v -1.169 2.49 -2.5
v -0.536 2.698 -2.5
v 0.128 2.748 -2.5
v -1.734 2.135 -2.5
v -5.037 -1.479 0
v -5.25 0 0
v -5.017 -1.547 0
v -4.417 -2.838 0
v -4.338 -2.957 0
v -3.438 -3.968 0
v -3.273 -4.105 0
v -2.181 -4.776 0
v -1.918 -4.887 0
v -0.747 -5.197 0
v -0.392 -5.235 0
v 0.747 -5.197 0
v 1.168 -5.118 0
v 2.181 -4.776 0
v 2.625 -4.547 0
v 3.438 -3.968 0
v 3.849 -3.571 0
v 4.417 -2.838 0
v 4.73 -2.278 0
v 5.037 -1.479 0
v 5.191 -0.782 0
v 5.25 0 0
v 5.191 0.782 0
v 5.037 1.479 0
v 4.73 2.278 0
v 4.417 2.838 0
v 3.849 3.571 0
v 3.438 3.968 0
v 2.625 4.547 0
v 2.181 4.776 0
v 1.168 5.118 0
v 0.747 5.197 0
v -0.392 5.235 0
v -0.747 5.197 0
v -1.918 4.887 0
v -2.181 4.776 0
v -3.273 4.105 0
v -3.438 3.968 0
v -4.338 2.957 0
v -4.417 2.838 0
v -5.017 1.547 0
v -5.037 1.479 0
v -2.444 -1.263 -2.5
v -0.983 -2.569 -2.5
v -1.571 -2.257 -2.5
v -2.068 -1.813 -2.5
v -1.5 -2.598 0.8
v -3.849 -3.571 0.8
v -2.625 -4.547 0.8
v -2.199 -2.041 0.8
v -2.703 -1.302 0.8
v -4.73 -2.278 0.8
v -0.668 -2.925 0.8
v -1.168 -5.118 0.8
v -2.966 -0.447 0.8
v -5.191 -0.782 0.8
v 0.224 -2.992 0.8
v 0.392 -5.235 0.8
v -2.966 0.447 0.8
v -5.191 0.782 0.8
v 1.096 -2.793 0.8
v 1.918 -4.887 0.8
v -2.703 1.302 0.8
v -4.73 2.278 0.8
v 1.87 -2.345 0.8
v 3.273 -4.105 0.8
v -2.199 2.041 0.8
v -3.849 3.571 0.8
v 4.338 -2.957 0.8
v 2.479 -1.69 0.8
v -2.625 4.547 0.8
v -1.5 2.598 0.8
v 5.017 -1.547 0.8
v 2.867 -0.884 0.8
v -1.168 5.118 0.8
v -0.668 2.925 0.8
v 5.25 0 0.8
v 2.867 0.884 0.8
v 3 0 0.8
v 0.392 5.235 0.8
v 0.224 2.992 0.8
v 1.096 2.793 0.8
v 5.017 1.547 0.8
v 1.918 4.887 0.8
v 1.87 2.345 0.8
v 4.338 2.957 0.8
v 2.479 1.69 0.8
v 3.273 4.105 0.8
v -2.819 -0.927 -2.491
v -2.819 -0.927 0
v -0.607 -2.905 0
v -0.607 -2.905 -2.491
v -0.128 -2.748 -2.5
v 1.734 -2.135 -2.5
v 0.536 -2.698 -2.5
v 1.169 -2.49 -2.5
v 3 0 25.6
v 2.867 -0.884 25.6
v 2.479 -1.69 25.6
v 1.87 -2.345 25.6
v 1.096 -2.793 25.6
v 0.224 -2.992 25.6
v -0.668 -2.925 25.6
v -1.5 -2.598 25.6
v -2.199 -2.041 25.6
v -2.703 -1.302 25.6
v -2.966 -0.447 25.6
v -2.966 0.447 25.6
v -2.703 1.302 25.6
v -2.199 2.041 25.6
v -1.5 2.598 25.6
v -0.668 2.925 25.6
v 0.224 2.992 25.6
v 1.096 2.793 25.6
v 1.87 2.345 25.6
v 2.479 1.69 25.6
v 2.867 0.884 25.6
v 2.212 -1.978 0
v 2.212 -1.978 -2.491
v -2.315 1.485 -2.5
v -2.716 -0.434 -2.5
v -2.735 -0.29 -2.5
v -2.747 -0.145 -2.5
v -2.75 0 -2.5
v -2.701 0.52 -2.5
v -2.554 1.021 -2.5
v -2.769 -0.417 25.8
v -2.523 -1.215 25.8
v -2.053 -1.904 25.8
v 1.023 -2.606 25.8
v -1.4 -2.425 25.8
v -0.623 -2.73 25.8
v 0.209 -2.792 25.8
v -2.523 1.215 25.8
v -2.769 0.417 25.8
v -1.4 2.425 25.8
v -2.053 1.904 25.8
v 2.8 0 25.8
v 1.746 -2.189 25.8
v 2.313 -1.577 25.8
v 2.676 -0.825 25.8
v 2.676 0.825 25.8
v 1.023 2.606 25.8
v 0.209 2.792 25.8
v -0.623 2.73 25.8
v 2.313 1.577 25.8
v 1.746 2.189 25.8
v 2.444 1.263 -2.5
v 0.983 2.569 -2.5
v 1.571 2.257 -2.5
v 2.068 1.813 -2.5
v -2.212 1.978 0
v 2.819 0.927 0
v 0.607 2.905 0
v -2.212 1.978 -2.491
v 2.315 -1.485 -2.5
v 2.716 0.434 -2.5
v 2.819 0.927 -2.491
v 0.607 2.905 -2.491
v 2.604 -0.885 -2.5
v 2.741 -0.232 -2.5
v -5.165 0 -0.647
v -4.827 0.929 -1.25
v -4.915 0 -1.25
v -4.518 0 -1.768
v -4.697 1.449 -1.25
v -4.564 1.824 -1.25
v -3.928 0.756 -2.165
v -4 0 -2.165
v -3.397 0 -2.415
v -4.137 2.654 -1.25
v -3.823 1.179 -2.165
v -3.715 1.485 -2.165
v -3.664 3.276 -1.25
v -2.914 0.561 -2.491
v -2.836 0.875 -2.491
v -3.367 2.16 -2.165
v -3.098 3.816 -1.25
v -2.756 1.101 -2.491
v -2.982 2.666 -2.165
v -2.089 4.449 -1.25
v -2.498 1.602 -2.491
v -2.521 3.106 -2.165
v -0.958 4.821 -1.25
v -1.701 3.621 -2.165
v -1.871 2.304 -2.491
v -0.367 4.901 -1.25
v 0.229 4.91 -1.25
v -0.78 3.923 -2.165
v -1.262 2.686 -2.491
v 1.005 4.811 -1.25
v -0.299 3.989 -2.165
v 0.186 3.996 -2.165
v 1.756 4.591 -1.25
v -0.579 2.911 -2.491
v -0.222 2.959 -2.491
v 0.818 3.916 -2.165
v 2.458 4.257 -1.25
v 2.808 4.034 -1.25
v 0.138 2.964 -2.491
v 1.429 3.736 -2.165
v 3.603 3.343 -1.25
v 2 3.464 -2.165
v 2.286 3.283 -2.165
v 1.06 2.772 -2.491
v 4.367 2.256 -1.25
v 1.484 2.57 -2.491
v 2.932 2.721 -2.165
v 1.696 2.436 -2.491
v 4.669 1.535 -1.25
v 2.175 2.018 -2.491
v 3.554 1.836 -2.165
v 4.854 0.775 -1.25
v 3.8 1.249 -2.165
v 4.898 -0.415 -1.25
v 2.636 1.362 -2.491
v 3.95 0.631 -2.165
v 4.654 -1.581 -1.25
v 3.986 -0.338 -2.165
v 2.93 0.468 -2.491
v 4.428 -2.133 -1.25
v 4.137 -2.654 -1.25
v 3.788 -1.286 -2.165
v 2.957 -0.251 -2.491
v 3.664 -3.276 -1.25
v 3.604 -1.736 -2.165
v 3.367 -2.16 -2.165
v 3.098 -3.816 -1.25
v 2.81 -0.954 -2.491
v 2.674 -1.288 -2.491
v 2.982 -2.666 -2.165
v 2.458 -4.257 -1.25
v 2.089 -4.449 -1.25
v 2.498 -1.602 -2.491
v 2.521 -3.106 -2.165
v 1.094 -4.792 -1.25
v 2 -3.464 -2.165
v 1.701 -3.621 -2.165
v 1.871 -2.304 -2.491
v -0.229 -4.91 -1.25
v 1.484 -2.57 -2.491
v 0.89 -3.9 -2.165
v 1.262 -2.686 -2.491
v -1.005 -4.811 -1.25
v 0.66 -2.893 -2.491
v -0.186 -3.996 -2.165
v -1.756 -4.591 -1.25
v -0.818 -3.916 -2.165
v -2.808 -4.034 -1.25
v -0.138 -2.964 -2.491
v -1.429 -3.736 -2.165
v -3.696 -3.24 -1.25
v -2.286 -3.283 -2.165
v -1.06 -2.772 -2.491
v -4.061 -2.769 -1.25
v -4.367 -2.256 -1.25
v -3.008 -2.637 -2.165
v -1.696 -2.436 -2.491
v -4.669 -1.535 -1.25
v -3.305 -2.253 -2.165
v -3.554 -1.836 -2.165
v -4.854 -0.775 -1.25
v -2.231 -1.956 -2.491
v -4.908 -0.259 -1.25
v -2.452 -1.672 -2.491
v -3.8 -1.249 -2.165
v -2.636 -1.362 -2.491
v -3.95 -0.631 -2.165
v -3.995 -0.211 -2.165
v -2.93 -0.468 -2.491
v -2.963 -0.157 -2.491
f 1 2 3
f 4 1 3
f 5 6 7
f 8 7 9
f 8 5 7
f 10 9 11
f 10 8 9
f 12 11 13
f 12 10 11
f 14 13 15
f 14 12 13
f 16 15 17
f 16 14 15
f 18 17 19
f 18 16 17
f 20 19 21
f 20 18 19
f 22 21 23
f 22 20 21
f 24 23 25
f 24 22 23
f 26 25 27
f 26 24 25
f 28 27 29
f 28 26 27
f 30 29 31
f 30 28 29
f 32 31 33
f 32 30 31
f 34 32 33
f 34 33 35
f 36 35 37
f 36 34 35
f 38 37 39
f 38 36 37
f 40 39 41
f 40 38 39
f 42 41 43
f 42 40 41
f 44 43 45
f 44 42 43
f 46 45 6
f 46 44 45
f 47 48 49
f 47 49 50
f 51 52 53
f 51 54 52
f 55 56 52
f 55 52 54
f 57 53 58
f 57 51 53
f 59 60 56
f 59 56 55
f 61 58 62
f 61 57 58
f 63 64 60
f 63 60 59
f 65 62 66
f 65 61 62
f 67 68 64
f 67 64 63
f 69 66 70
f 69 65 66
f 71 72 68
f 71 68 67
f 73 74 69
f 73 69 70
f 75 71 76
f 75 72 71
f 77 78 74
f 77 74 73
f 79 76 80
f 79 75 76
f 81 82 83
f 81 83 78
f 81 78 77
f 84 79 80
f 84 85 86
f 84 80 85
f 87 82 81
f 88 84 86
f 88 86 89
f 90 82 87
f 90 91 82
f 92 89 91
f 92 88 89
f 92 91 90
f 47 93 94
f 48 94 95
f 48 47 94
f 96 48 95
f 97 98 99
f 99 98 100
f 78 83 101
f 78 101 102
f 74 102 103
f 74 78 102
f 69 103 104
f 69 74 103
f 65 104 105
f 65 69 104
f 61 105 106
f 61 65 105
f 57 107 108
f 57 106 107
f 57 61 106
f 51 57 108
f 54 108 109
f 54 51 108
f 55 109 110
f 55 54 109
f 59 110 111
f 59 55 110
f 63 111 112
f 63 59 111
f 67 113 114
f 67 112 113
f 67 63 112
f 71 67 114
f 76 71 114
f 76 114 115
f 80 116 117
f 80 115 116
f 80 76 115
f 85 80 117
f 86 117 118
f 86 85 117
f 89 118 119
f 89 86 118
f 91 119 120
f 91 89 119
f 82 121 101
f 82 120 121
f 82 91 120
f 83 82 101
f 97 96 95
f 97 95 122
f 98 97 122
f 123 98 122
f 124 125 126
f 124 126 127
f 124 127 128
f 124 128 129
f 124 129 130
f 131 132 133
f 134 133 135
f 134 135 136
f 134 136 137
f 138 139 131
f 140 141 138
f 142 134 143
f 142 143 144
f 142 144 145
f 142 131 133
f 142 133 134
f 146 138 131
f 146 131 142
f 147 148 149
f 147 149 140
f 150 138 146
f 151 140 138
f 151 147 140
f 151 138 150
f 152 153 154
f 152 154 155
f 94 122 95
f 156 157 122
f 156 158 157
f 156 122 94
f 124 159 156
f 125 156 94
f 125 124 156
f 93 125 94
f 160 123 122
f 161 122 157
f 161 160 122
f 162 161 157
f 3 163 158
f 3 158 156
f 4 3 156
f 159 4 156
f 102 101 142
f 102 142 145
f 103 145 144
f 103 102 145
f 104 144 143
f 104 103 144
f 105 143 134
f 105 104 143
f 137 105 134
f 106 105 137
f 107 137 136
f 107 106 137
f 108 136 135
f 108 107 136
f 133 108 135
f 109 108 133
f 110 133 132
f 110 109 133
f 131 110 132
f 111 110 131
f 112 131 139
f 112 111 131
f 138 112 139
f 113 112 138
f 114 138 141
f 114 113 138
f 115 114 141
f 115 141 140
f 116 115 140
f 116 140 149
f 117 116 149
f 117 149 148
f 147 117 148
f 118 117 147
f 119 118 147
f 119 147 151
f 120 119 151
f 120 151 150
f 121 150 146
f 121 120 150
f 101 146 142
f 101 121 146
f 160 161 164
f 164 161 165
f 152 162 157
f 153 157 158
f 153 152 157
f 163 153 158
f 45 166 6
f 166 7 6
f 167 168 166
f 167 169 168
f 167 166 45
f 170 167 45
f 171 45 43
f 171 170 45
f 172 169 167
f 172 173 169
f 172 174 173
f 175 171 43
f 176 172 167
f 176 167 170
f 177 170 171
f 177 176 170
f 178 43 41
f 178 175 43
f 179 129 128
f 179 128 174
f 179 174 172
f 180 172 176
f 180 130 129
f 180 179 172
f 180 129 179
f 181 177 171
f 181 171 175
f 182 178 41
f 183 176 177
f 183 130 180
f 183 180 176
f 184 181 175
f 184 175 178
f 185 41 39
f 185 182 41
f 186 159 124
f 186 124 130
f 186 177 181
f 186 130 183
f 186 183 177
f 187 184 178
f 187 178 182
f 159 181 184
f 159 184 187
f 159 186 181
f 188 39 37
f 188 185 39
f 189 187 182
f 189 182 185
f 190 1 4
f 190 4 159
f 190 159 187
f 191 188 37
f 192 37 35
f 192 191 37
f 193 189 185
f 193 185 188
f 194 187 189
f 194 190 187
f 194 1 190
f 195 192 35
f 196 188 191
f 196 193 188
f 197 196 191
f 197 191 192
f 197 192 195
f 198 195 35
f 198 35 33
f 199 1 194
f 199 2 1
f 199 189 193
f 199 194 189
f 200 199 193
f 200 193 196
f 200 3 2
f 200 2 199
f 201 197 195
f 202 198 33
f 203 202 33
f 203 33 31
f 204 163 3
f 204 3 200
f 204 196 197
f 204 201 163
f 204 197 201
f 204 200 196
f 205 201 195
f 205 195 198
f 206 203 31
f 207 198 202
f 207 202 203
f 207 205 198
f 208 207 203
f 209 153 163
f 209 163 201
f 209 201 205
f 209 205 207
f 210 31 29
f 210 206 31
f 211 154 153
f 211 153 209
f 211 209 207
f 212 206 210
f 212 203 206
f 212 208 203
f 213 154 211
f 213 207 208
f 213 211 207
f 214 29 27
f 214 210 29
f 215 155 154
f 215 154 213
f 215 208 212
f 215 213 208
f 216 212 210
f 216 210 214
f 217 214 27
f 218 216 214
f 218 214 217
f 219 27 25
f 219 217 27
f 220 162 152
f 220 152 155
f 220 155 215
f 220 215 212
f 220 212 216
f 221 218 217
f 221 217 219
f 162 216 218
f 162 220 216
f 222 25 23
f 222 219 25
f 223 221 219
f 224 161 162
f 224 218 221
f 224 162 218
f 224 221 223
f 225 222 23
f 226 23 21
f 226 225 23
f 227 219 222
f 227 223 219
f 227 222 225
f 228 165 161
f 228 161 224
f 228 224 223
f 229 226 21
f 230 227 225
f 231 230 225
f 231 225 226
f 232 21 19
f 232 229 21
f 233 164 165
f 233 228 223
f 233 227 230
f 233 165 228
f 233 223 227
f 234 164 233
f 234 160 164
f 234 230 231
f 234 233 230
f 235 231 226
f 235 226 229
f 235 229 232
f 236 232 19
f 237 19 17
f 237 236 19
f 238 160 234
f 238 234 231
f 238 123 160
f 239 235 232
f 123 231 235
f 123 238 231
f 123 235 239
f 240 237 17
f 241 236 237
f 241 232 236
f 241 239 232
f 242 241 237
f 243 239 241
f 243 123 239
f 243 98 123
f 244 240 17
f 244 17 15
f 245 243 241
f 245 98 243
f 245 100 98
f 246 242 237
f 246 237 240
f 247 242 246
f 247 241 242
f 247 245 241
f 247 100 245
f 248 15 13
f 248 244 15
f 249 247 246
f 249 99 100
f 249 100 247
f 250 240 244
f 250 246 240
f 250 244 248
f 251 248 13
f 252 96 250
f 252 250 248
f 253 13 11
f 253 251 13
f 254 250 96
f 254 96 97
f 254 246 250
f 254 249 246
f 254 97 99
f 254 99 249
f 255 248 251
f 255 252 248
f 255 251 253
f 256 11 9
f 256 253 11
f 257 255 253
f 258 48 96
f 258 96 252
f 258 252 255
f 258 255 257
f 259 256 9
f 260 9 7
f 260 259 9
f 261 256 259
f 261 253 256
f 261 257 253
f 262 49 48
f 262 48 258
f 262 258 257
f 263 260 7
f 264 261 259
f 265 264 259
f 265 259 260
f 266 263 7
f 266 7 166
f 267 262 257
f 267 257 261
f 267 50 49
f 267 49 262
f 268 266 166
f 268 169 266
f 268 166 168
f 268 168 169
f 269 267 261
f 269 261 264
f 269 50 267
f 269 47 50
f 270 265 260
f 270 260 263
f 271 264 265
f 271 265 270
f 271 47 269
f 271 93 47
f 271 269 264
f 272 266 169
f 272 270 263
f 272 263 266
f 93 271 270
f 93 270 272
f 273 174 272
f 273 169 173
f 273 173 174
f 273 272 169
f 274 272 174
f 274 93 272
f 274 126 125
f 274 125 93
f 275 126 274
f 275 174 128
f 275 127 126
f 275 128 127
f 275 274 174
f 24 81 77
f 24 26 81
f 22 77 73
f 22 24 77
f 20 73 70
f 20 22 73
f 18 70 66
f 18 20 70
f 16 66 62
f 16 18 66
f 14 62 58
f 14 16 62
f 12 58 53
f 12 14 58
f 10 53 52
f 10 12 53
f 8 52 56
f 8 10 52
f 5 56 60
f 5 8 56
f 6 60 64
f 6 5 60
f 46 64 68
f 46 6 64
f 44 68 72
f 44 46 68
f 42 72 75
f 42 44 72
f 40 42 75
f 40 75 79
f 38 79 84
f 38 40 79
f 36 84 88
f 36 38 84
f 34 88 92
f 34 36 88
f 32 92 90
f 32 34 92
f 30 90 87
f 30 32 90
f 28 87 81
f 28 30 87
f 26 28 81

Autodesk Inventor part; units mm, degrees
ref_plane "YZ Plane" through (0, 0, 0) normal (1, 0, 0) x (0, 1, 0)
ref_plane "XZ Plane" through (0, 0, 0) normal (0, 1, 0) x (-1, 0, 0)
ref_plane "XY Plane" through (0, 0, 0) normal (0, 0, 1) x (1, 0, 0)
sketch "Sketch1" plane through (0, 0, 0) normal (0, 0, 1) x (1, 0, 0)
  circle A0 centre (0, 0) radius 3
  circle A1 centre (0, 0) radius 5.25
  dimension "d0" = 6
  dimension "d1" = 10.5
extrude "Extrusion1" add sketch "Sketch1" along normal blind 0.8
extrude "Extrusion2" add sketch "Sketch1" along normal blind 25.8 contours A0
thread "Thread1" size "M6x1" class "6g" standard "ANSI Metric M Profile" length 348
sketch "Boceto3" plane through (0, 0, 0) normal (0, 0, -1) x (-1, 0, 0)
  circle A0 centre (0, 0) radius 5.25
extrude "Extrusión3" add sketch "Boceto3" along normal blind 2.5
fillet "Empalme2" radius 2.5 1 edges at (5.25, 0, -2.5)
sketch "Boceto4" plane through (0, 0, -2.5) normal (0, 0, -1) x (-1, 0, 0)
  line L0 (-2.2122, -1.978) -> (-2.8191, 0.9269)
  line L1 (-2.8191, 0.9269) -> (-0.6069, 2.9049)
  line L2 (-0.6069, 2.9049) -> (2.2122, 1.978)
  line L3 (2.2122, 1.978) -> (2.8191, -0.9269)
  line L4 (2.8191, -0.9269) -> (0.6069, -2.9049)
  line L5 (0.6069, -2.9049) -> (-2.2122, -1.978)
  point P0 (0, 0)
  point P1 (0, 0)
  dimension "d12" = 5.14
extrude "Extrusión4" cut sketch "Boceto4" against normal blind 2.5
chamfer "Chaflán1" distance 0.2 angle 45 1 edges at (-3, 0, 25.8)
properties part number "Tornillo Allen cabeza botón M6x25mm"
